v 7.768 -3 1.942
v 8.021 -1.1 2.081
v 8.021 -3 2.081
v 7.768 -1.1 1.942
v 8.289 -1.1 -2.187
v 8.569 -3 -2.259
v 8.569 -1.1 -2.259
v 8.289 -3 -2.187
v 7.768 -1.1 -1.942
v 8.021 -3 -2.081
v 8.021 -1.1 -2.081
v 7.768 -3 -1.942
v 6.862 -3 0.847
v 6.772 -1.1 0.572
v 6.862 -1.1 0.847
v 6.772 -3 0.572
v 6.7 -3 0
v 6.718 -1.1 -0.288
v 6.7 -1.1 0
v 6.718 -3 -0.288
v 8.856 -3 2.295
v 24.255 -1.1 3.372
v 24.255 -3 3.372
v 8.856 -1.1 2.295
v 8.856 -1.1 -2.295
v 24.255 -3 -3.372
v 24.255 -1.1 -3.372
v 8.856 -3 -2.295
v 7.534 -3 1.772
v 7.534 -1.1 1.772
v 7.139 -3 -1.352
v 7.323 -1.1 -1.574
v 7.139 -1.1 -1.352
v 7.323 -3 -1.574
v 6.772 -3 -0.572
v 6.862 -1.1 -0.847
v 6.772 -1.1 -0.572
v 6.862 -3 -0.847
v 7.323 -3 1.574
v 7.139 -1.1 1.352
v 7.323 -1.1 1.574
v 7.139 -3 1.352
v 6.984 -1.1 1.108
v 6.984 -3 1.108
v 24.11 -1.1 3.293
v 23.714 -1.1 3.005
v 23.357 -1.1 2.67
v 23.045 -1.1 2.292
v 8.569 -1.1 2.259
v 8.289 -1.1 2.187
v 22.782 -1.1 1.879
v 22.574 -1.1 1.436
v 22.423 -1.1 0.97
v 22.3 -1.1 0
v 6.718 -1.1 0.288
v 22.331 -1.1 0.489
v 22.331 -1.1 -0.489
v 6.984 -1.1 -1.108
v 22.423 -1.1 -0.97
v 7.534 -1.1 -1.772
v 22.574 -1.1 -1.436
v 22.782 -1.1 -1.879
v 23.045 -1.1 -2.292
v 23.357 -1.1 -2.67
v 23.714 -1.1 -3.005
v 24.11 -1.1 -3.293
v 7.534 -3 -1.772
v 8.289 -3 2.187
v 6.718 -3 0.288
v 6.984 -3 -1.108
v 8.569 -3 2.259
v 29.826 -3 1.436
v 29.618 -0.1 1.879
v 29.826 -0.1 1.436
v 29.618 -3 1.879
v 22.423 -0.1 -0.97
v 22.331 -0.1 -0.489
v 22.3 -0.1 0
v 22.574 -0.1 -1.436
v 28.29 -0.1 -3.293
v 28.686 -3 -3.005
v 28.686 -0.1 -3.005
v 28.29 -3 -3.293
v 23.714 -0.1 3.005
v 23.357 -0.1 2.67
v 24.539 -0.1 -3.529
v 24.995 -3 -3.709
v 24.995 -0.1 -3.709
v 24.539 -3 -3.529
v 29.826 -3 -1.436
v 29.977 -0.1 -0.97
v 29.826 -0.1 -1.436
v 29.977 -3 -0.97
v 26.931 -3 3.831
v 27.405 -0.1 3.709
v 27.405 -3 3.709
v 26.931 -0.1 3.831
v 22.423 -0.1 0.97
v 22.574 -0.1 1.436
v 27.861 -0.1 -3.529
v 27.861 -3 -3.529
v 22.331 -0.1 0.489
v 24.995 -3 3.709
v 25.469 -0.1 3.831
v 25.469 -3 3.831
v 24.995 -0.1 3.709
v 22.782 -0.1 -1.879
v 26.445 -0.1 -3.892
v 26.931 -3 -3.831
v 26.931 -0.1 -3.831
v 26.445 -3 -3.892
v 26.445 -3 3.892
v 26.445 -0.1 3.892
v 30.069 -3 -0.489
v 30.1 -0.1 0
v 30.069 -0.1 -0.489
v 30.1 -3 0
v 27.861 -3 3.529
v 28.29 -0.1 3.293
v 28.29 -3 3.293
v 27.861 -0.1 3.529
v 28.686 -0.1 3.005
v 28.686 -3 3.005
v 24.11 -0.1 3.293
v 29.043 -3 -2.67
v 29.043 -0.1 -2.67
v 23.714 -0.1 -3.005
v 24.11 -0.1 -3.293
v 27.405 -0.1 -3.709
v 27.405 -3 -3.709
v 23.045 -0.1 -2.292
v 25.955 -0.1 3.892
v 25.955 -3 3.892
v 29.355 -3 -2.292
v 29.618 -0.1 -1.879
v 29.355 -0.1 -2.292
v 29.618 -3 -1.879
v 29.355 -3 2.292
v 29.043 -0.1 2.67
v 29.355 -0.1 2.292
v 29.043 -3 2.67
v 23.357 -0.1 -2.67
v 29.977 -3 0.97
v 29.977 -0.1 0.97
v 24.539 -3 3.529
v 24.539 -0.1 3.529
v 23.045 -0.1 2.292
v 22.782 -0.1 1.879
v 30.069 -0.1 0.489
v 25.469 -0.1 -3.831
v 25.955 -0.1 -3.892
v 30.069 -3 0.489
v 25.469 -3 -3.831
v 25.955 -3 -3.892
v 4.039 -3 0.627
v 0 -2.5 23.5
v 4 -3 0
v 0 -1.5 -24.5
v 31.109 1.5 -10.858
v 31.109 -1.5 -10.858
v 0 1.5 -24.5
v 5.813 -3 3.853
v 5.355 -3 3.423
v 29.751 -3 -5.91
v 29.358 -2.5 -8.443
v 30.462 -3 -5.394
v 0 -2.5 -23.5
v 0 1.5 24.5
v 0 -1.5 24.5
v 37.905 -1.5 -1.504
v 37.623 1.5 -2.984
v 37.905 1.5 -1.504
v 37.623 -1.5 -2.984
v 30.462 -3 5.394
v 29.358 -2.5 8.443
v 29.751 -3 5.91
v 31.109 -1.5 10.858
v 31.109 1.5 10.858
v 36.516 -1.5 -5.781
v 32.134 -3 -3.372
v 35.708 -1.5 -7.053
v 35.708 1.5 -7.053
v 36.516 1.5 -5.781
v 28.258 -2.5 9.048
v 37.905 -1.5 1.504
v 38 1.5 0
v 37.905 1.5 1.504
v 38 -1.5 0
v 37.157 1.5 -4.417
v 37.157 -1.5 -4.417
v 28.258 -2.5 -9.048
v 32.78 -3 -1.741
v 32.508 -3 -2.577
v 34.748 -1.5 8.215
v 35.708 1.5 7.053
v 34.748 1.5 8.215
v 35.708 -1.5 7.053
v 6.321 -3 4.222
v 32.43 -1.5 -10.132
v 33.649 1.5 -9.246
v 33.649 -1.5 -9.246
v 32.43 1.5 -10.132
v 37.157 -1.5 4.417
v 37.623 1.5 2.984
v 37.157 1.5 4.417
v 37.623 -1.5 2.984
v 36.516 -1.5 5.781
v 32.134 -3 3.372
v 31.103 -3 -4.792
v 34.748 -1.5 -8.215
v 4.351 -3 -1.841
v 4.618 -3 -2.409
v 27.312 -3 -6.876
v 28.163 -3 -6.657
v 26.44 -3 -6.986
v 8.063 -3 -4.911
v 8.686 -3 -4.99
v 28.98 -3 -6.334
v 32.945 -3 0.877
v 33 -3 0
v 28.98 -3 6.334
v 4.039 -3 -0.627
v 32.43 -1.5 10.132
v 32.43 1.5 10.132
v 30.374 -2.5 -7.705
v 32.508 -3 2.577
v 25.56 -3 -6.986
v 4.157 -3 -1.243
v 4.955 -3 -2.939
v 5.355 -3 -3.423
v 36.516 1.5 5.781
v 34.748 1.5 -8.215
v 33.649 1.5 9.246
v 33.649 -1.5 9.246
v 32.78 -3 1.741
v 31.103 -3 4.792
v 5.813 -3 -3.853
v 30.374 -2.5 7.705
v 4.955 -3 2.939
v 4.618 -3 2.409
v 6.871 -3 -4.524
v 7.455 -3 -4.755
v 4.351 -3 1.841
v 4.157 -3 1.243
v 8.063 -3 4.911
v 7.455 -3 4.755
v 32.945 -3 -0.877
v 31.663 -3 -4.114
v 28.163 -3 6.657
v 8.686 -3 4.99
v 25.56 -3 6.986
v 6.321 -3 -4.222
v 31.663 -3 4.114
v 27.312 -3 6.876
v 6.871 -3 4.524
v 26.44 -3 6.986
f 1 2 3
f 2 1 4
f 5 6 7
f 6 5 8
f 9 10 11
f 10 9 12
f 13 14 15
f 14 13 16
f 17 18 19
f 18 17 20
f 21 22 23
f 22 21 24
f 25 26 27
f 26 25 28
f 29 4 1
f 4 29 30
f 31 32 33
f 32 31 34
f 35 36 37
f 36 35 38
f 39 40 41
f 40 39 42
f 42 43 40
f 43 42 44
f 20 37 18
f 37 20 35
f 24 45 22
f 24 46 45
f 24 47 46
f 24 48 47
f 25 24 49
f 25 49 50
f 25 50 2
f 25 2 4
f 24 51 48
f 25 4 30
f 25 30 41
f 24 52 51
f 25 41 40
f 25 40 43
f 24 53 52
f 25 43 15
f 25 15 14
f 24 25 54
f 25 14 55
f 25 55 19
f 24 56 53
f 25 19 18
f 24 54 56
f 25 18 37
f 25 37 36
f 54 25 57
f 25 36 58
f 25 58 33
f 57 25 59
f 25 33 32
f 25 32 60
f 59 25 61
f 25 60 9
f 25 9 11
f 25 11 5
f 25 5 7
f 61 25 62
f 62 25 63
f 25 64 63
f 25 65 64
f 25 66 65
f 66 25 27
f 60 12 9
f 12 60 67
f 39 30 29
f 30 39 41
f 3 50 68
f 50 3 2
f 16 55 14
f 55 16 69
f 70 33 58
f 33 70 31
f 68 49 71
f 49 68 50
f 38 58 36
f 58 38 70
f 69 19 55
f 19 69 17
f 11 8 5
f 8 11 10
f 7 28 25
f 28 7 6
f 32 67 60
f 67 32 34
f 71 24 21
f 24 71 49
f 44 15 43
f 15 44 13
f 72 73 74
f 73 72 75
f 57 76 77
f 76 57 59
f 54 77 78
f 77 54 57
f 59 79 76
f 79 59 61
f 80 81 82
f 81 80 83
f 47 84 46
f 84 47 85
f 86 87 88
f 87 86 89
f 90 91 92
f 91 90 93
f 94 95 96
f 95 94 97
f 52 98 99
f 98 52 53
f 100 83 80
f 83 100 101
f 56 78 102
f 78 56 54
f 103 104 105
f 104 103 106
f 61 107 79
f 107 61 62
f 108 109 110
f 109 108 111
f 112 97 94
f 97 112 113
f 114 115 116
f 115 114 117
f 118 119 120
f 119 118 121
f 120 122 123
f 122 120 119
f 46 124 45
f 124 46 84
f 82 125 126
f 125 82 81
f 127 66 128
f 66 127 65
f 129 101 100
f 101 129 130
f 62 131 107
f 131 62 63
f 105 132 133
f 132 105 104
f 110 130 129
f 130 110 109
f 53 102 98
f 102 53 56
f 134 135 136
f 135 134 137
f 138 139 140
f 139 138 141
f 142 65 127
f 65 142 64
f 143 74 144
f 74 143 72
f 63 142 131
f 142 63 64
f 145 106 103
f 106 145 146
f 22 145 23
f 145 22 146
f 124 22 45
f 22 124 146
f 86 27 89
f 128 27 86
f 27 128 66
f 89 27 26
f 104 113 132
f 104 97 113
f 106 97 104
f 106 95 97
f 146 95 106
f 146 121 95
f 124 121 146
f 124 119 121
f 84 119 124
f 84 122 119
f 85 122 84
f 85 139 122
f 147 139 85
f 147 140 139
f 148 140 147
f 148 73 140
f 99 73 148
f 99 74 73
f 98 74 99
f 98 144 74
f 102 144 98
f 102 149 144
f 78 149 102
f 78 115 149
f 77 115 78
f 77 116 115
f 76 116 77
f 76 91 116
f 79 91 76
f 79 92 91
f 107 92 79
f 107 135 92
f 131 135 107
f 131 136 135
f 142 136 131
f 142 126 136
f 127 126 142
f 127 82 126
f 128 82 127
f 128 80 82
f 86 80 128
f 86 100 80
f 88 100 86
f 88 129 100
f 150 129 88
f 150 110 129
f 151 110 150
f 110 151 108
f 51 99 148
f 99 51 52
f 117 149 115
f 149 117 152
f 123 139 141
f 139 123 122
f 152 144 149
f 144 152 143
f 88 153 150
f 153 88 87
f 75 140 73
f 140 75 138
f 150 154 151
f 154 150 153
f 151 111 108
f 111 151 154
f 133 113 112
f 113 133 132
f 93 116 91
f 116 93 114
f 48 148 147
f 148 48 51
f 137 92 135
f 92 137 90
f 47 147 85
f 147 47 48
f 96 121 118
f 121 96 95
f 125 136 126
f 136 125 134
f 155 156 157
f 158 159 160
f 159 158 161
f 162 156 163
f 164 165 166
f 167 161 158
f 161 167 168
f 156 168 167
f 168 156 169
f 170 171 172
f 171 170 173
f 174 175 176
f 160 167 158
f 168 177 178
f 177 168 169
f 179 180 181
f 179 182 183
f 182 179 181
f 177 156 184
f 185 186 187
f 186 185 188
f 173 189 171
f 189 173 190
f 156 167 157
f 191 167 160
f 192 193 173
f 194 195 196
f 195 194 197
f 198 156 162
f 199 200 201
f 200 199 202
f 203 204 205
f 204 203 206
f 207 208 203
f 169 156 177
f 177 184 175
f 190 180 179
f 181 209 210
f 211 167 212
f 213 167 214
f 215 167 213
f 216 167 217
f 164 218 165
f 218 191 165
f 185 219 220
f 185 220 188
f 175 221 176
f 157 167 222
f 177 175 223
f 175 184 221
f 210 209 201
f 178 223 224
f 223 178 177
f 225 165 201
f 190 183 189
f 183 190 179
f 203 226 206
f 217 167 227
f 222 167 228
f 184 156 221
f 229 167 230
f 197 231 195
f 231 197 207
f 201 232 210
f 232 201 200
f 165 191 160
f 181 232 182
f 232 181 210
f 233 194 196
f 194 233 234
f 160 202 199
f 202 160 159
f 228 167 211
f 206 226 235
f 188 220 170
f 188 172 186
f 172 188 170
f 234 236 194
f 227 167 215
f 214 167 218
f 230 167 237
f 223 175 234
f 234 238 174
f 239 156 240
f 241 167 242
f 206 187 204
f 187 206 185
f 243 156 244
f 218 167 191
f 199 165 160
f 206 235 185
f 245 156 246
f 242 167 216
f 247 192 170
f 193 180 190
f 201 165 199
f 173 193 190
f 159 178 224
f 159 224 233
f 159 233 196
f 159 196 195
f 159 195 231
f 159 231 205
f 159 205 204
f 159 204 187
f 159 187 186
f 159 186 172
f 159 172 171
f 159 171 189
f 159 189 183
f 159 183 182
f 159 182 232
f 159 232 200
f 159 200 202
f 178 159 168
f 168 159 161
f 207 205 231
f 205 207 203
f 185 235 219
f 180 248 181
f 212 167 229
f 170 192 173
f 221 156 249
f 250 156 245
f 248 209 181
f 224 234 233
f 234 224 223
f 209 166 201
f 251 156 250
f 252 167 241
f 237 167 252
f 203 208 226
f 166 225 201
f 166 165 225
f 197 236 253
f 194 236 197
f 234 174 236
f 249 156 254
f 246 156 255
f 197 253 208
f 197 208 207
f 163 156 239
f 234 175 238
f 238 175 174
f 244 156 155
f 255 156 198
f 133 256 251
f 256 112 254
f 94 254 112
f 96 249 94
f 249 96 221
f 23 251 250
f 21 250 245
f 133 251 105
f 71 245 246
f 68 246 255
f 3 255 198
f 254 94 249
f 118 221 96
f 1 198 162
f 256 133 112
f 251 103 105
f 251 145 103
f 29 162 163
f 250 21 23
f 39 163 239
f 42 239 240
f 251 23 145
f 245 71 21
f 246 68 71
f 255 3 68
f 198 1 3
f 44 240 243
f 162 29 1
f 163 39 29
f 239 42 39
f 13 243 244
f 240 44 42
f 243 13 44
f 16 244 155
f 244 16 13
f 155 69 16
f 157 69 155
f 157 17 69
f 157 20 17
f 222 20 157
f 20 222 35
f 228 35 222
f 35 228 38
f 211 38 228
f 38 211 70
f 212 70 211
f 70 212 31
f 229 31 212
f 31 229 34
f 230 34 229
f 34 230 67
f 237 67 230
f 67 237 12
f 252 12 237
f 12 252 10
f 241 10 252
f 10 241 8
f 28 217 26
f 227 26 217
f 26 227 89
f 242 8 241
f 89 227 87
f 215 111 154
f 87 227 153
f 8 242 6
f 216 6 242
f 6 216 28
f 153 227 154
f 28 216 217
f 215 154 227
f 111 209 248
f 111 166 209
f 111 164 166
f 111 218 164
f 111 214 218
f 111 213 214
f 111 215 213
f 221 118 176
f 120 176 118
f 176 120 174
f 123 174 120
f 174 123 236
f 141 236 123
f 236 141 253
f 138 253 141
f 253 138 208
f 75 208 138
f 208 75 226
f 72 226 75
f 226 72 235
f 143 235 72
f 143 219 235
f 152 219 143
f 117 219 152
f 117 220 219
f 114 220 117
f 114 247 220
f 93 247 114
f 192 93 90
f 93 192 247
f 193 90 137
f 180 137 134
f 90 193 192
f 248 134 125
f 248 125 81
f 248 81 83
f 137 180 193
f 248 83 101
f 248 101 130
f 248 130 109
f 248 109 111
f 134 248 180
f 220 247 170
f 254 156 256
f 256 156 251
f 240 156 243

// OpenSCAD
// file: microServo.scad
//    This file is part of PMR-Model.
//
//    PMR-Model is free software: you can redistribute it and/or modify
//    it under the terms of the GNU General Public License as published by
//    the Free Software Foundation, either version 3 of the License, or
//    (at your option) any later version.
//
//    PMR-Model is distributed in the hope that it will be useful,
//    but WITHOUT ANY WARRANTY; without even the implied warranty of
//    MERCHANTABILITY or FITNESS FOR A PARTICULAR PURPOSE.  See the
//    GNU General Public License for more details.
//
//    You should have received a copy of the GNU General Public License
//    along with PMR-Model.  If not, see <http://www.gnu.org/licenses/>.

// simplified model of the tower-pro mg90 micro-servo

width = 13.5;
length = 23;

$fn=50;

servo();
translate([5,0,19.5]) axisMount();

module servo(){
	union(){
		translate([-length/2-0.2, -width/2, -11.5]){
			//body
			union(){
				cube([length+0.4, width, length]);
				translate([length, 0, 19]){
					union(){
						difference(){
							cube([5, width, 2.5]);
							
							translate([3, 5.75, -1]) cube([4, 1.5, 4]);						
						}
						#translate([0.8, 0, 0]) hull(){
							translate([2.4, width/2, -5]){
								cylinder(h=15, r=1.25);
							}							
							translate([1.4, width/2, -5]){
								cylinder(h=15, r=1.25);
							}
						}						
					}
				}
				translate([-5, 0, 19]){
					union(){
						difference(){
							cube([5, width, 2.5]);

							translate([-2, 6, -1]) cube([4, 1.5, 4]);												
						}
						#hull(){
							translate([2, width/2, -5]){
								cylinder(h=15, r=1.25);
							}								
							translate([3, width/2, -5]){
								cylinder(h=15, r=1.25);
							}
						}
					}
				}					
			}

		}
		translate([length/2-width/2, 0, length/2]){
			union(){
				cylinder(h=gearHeight, r=width/2);
				translate([-length/4-1, 0, 0]){
					cylinder(h=gearHeight, r=3.5);
				}
				translate([0, 0, -40]){
					#cylinder(h=80, r=1.2);
				}
			}
		}
	}
	gearHeight = 5.5;
}


//	Mounting lever of micro servo tower-pro MG90
radBase1 = 2.3;
radBase2 = 3.5;
heightBase = 2.4;

radAxis = 3.9;
heightAxis = 6;

module axisMount(){
	difference(){
		union(){
			// base of the lever
			hull(){
				cylinder(r=radBase2, h=heightBase);				
				translate([23-radBase1-radBase2,0,0]){
					cylinder(r=radBase1, h=heightBase);
				}
			}
			// axis
			translate([0,0,-1]){
				cylinder(r=radAxis, h=heightAxis);
			}
		}
	}
}
// main file
//    This file is part of PMR-Model.
//
//    PMR-Model is free software: you can redistribute it and/or modify
//    it under the terms of the GNU General Public License as published by
//    the Free Software Foundation, either version 3 of the License, or
//    (at your option) any later version.
//
//    PMR-Model is distributed in the hope that it will be useful,
//    but WITHOUT ANY WARRANTY; without even the implied warranty of
//    MERCHANTABILITY or FITNESS FOR A PARTICULAR PURPOSE.  See the
//    GNU General Public License for more details.
//
//    You should have received a copy of the GNU General Public License
//    along with PMR-Model.  If not, see <http://www.gnu.org/licenses/>.

// sidewalls of the two parts building the joint
use <microServo.scad>;


$fn=50;

sideWall_withServoAxisFix(49, 26, 3, 12);
//sideWall(49, 26, 3, 12);


// simple wall
module sideWall(height, length, strength, radius){
	hull(){
		difference(){					
			translate([0,-strength/2,-height/2]) cube([length,strength,height]);
			translate([0,-strength,-height/2]) rotate(a=45,v=[0,1,0]) cube([100,strength*2,100]);					
			translate([0,-strength,height/2]) rotate(a=45,v=[0,1,0]) cube([100,strength*2,100]);				
		}
		translate([length,strength/2,0.5*height-height/2]){
			rotate(a=90,v=[1,0,0]){
				cylinder(h=strength, r=radius);
			}
		}
	}
}

// wall where the servo axis mount can be mounted
module sideWall_withServoAxisFix(height, length, strength, radius){
	difference(){
		hull(){
			sideWall(height, length, strength, radius);
			translate([0,-1,0]) sideWall(height-2, length-2, strength, radius-2);
			translate([length,0,0]) difference(){
				hull(){
					translate([-17,0,0]) rotate(a=90, v=[1,0,0]) cylinder(h=strength, r=5);
					rotate(a=90, v=[1,0,0]) cylinder(h=strength, r=7);								
				}
			}
		}
		translate([length+0.2,-1.1,0]) rotate(a=180, v=[0,1,0]){
			rotate(a=90, v=[1,0,0]){
				axisMount();
			}
		}
	}
}
